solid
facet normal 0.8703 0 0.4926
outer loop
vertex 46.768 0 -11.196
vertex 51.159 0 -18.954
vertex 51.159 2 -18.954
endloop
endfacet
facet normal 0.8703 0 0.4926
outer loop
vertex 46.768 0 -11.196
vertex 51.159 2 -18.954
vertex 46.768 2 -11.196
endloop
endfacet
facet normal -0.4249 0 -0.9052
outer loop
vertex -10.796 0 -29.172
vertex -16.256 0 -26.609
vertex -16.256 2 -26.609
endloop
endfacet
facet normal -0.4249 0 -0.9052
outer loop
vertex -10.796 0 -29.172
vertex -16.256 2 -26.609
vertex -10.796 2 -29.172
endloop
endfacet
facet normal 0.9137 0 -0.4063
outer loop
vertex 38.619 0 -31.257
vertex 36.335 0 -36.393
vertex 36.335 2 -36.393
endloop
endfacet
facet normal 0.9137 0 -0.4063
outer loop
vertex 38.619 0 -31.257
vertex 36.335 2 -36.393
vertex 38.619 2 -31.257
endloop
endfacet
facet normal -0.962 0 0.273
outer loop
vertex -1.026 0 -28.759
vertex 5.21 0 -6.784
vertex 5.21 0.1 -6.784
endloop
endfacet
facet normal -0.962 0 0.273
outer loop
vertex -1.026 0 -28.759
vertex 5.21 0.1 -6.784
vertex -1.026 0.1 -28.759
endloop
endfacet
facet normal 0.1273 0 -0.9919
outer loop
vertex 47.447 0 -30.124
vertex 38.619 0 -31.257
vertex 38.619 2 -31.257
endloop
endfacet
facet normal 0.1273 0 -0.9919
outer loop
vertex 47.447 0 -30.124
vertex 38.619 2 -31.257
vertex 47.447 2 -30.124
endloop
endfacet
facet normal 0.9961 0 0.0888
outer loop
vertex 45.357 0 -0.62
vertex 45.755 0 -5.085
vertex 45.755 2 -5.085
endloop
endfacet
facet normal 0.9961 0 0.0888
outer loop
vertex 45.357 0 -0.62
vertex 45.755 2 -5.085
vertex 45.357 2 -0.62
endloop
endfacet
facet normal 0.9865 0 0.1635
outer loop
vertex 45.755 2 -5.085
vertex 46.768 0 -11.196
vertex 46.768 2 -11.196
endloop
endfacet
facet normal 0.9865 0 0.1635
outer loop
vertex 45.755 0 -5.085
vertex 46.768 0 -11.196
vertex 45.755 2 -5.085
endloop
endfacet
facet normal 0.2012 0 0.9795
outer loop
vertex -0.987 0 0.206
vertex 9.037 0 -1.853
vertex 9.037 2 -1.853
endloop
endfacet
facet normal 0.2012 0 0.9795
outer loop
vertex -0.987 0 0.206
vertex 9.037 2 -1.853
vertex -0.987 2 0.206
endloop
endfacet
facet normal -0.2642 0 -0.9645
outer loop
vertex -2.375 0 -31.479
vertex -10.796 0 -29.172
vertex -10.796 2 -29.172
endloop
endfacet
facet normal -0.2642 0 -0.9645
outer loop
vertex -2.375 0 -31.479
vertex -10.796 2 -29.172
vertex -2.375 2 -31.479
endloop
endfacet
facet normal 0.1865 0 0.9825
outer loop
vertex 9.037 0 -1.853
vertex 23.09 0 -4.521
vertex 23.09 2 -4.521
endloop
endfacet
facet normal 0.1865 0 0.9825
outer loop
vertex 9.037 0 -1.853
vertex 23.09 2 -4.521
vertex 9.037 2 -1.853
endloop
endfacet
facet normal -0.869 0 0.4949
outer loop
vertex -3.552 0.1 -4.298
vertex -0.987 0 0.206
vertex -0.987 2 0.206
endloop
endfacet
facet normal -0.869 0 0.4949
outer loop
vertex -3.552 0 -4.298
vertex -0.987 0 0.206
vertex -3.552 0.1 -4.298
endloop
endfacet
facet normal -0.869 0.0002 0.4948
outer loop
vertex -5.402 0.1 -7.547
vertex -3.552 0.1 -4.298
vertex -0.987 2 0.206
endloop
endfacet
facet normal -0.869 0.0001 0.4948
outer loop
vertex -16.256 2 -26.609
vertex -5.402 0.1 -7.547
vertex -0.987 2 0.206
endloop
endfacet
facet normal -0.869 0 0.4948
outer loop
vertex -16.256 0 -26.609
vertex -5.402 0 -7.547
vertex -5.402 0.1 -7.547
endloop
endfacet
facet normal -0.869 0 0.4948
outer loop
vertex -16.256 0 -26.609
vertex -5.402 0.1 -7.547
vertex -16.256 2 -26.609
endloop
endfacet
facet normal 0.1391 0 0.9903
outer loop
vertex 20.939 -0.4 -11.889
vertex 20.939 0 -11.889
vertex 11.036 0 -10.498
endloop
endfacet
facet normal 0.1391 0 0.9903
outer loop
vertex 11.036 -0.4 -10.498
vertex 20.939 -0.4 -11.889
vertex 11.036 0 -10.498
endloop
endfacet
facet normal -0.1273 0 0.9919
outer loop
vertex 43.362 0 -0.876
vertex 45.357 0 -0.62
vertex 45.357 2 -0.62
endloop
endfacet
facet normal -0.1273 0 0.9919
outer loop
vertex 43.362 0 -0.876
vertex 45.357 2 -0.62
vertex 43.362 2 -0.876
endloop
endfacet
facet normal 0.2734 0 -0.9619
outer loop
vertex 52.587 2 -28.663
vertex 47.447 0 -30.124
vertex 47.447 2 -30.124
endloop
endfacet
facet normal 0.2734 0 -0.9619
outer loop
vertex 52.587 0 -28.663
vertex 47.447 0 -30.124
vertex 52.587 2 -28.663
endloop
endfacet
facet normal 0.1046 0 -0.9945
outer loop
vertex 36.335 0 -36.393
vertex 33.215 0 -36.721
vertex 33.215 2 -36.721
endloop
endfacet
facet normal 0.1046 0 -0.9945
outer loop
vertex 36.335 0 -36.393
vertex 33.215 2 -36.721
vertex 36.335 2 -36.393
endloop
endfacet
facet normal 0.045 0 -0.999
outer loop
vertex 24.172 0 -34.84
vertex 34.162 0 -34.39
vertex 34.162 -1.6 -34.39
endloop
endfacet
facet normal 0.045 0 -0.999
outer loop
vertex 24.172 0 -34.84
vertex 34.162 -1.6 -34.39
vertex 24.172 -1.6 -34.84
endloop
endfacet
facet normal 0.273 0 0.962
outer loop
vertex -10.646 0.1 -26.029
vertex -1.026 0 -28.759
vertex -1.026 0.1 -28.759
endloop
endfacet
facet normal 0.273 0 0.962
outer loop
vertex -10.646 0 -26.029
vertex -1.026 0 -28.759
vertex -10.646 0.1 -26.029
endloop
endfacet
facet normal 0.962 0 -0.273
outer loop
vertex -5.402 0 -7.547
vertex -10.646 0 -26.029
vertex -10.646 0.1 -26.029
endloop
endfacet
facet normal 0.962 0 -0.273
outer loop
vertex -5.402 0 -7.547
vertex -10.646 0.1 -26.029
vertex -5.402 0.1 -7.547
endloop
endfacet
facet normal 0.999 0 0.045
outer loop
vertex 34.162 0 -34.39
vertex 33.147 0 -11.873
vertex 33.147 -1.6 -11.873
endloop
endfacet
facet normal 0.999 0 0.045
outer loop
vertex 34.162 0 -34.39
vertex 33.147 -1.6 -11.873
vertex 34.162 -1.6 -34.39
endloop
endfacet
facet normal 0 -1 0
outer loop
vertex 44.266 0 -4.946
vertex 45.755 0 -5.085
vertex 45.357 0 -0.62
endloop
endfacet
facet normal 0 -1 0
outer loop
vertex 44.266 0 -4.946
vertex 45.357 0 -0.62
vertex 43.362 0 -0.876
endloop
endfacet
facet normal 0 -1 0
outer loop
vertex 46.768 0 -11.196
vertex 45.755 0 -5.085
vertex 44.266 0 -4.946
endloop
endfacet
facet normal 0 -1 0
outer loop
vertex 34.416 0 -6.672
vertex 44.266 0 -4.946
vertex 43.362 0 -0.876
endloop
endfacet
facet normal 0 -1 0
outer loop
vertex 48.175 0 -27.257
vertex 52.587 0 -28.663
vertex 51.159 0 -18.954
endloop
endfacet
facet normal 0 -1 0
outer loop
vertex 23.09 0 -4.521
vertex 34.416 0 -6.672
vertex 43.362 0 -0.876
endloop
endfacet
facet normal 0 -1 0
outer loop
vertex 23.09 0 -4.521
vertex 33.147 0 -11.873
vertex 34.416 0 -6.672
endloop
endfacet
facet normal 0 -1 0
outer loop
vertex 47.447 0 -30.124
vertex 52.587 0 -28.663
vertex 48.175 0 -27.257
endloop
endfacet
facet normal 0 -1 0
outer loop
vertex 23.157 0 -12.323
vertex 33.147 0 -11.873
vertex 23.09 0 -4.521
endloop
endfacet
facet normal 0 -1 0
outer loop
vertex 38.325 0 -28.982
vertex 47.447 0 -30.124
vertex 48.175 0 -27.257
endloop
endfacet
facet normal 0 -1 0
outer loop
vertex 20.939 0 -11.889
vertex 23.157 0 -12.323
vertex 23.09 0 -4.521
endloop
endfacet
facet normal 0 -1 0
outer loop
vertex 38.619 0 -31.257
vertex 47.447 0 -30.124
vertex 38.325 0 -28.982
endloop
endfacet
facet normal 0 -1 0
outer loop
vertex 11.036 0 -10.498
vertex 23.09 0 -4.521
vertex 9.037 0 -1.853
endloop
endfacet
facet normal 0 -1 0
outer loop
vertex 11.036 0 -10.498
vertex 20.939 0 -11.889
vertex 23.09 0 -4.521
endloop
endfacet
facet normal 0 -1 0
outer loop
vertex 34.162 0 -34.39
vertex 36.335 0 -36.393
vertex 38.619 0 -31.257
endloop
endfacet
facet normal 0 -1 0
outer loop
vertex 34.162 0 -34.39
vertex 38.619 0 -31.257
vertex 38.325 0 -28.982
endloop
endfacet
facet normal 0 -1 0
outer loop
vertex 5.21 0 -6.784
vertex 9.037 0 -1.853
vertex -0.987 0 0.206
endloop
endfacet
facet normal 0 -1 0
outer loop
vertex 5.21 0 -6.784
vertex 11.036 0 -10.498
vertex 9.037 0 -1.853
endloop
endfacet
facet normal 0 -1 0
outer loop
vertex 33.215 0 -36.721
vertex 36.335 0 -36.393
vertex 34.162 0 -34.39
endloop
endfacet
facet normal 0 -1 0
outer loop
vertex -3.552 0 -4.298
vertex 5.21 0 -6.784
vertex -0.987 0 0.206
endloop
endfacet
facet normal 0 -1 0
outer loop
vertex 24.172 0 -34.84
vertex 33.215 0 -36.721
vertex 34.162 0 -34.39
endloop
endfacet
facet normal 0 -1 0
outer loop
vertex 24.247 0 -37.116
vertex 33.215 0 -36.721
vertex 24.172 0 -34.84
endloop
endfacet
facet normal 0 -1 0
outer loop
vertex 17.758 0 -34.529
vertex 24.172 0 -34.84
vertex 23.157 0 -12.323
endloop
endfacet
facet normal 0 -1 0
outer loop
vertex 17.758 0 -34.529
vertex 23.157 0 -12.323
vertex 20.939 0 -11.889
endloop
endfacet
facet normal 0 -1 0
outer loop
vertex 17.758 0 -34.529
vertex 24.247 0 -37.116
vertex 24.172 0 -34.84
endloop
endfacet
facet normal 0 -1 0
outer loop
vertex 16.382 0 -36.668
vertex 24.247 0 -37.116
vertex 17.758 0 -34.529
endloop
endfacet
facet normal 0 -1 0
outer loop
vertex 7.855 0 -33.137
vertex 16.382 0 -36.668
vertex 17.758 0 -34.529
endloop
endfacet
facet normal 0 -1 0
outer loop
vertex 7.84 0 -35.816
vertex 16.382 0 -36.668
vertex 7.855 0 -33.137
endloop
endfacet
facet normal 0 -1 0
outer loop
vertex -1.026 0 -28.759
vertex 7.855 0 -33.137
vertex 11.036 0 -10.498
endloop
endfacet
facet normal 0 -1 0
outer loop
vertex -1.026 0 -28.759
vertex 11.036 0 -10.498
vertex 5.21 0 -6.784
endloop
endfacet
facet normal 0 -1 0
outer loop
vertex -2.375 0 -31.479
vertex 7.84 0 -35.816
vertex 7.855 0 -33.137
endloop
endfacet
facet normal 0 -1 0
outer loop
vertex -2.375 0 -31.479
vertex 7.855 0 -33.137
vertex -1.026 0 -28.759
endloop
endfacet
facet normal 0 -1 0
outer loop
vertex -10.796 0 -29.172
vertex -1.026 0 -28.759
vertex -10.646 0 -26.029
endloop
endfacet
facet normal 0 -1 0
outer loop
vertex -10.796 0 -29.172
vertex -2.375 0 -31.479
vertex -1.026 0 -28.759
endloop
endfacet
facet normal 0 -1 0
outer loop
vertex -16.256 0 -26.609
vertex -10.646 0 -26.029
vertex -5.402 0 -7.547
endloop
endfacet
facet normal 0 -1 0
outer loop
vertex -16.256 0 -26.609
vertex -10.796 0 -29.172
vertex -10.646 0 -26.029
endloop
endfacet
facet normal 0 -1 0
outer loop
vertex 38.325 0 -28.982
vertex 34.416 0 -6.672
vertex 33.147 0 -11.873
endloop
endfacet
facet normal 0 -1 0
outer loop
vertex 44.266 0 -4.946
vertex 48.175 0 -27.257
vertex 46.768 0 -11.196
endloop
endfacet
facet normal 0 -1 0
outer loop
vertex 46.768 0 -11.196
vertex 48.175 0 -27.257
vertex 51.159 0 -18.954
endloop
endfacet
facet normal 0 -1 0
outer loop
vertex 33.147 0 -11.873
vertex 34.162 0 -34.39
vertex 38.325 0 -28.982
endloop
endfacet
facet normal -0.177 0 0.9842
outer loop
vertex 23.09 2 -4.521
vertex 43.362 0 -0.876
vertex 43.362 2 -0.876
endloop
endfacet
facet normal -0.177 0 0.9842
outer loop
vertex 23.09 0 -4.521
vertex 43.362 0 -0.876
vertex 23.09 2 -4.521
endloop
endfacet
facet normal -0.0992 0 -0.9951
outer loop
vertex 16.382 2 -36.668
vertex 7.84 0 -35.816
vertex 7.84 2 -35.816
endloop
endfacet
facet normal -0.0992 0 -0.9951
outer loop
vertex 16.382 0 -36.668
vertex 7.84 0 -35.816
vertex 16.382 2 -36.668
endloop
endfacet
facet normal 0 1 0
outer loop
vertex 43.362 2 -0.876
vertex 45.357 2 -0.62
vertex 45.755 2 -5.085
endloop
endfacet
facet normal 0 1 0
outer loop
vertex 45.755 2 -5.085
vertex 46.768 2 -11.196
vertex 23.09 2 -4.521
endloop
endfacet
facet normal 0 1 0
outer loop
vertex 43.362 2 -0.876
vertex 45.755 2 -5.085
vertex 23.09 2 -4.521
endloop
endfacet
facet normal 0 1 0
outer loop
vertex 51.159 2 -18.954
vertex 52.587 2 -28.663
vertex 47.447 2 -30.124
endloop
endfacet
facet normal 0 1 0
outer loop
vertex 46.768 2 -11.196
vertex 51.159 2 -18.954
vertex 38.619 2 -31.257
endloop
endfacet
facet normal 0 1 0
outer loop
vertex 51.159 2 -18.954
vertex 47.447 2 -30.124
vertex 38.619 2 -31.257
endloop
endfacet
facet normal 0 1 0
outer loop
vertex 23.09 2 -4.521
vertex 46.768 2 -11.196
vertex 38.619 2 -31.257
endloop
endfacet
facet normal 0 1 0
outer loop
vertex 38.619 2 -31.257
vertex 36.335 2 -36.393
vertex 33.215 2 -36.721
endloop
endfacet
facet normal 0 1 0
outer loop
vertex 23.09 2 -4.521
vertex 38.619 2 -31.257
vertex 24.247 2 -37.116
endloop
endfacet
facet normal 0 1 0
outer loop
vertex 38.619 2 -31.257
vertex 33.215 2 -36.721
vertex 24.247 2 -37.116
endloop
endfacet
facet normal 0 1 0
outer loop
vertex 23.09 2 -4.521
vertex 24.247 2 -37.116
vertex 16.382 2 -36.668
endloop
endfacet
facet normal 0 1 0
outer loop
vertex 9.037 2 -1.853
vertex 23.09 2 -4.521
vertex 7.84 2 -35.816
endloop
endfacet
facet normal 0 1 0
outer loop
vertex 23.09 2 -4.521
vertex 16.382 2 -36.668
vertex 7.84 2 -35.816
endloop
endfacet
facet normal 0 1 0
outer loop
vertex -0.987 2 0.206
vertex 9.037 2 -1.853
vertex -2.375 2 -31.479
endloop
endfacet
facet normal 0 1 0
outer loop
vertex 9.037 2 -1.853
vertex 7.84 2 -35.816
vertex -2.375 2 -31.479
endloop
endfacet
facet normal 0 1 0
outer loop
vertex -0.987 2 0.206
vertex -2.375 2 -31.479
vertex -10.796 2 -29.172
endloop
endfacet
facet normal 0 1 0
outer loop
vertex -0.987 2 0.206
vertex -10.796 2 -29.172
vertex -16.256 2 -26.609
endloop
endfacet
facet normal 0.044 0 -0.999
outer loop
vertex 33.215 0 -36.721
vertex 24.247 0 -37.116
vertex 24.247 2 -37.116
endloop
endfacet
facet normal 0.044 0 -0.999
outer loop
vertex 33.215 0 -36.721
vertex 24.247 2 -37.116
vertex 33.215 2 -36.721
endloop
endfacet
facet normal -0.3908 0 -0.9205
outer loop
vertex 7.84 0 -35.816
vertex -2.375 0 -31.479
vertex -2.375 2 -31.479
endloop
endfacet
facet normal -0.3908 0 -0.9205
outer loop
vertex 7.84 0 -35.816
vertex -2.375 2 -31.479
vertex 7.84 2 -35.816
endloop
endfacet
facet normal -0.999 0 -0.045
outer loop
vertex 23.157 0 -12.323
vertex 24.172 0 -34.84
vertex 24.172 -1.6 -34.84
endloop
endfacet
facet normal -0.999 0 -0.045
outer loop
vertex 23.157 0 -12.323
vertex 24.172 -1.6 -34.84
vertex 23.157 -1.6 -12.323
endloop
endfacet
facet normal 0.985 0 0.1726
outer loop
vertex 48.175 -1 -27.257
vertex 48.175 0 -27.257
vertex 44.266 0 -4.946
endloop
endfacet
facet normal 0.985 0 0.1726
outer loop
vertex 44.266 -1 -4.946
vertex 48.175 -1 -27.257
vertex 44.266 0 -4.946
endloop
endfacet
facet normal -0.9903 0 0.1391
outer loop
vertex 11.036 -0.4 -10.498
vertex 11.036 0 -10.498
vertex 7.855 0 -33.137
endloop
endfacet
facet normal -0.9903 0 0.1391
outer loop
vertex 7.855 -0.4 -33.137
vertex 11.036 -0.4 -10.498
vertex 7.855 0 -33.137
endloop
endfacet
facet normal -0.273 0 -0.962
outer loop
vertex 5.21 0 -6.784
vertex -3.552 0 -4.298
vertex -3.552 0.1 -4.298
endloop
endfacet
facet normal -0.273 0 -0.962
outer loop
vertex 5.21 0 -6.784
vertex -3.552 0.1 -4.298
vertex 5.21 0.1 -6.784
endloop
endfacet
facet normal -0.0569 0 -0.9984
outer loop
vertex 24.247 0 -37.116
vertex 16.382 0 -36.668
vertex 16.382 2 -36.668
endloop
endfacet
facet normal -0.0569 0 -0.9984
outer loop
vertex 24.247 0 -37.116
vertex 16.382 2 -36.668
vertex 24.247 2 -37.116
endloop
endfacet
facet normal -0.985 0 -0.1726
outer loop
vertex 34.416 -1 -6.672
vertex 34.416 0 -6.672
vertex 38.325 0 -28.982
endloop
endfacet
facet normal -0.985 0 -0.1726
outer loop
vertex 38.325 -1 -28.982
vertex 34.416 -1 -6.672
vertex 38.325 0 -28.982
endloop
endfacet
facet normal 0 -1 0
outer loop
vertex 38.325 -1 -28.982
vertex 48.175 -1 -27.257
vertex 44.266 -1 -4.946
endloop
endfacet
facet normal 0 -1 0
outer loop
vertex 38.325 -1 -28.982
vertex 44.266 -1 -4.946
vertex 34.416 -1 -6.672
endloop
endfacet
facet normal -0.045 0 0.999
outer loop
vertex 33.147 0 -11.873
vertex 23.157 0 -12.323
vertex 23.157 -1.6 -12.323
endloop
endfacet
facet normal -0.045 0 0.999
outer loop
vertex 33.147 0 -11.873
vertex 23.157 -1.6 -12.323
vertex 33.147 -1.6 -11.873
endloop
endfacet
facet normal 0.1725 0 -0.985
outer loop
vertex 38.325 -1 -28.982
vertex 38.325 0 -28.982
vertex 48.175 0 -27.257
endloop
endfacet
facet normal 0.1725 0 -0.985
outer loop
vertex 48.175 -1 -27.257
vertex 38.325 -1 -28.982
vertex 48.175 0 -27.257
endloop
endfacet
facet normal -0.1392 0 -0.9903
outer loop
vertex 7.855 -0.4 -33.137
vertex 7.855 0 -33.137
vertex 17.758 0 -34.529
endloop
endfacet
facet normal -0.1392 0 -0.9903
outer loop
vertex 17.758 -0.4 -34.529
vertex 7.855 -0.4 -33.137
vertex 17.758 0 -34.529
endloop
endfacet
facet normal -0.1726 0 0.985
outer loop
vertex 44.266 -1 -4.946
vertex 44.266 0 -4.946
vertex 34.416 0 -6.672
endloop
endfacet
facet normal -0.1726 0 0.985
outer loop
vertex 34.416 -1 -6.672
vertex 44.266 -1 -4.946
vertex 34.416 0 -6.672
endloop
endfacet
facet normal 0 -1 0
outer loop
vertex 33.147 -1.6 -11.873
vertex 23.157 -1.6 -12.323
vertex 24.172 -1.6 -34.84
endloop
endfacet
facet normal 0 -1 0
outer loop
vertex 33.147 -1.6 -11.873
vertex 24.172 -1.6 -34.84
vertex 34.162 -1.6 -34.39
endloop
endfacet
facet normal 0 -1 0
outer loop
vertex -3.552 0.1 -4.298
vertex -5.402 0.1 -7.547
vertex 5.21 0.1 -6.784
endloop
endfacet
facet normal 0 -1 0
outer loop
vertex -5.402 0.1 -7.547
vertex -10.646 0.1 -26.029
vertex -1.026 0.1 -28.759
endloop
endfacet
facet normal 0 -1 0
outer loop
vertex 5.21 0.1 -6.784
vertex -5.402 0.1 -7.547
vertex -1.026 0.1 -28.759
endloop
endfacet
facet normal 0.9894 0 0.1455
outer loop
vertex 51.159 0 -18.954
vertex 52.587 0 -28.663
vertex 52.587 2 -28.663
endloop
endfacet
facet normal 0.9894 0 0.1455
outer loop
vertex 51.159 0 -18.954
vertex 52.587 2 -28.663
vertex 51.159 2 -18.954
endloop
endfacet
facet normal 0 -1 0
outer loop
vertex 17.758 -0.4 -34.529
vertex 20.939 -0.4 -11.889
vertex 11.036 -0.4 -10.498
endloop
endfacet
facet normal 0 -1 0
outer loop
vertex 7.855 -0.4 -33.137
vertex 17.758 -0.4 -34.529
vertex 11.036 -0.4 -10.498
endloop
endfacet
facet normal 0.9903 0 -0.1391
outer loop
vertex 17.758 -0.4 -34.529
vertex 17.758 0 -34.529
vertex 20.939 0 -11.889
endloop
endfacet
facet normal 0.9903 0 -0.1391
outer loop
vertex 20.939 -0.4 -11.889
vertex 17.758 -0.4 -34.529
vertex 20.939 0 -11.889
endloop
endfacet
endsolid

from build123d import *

# Parameters (mm, degrees)
BOSS_EXTRUDE1_DEPTH = 0.1
BOSS_EXTRUDE2_DEPTH = 0.4
BOSS_EXTRUDE3_DEPTH = 1.6
BOSS_EXTRUDE4_DEPTH = 1
BOSS_EXTRUDE6_DEPTH = 2
CUT_EXTRUDE1_DEPTH  = 0.1


with BuildPart() as part:
    # Sketch1 → Boss-Extrude1 (new body)
    with BuildSketch(Plane(origin=(0, 0, 0), x_dir=(1, 0, 0), z_dir=(0, 1, 0))):
        Polygon((-10.646042249, 26.02895066), (-5.401733978, 7.546949539), (-3.551765124, 4.298091631), (5.209504113, 6.784120954), (-1.025832553, 28.758706218), align=None)
    extrude(amount=BOSS_EXTRUDE1_DEPTH)



with BuildPart() as body_2:
    # Sketch1<4> → Boss-Extrude2 (new body)
    with BuildSketch(Plane(origin=(0, 0, 0), x_dir=(1, 0, 0), z_dir=(0, 1, 0))):
        Polygon((17.758145427, 34.528733828), (7.855406085, 33.137420227), (11.036175402, 10.498146498), (20.938914744, 11.889460098), align=None)
    extrude(amount=-BOSS_EXTRUDE2_DEPTH)


with BuildPart() as body_3:
    # Sketch1<6> → Boss-Extrude3 (new body)
    with BuildSketch(Plane(origin=(0, 0, 0), x_dir=(1, 0, 0), z_dir=(0, 1, 0))):
        Polygon((34.161951749, 34.390264264), (24.172089788, 34.840439781), (23.15739477, 12.323304181), (33.147256731, 11.873128664), align=None)
    extrude(amount=-BOSS_EXTRUDE3_DEPTH)


with BuildPart() as body_4:
    # Sketch1<7> → Boss-Extrude4 (new body)
    with BuildSketch(Plane(origin=(0, 0, 0), x_dir=(1, 0, 0), z_dir=(0, 1, 0))):
        Polygon((48.175095059, 27.256571334), (38.325120534, 28.98226014), (34.416396618, 6.671846549), (44.266371143, 4.946157743), align=None)
    extrude(amount=-BOSS_EXTRUDE4_DEPTH)


with BuildPart() as part_1:
    add(part.part)

    add(body_2.part)  # Boss-Extrude6 merges body 2

    add(body_3.part)  # Boss-Extrude6 merges body 3

    add(body_4.part)  # Boss-Extrude6 merges body 4
    # Sketch1<9> → Boss-Extrude6 (add)
    with BuildSketch(Plane(origin=(0, 0, 0), x_dir=(1, 0, 0), z_dir=(0, 1, 0))):
        Polygon((-10.796366677, 29.172241213), (-16.256074113, 26.609004932), (-0.986799702, -0.206421066), (9.037125491, 1.85322051), (23.089608754, 4.521255887), (43.361671586, 0.876173274), (45.356947793, 0.620078516), (45.754807654, 5.085280828), (46.768236946, 11.196430212), (51.159441766, 18.953851746), (52.586728994, 28.662836734), (47.446591859, 30.124478905), (38.61884098, 31.25680776), (36.335094453, 36.39348437), (33.214867012, 36.720672561), (24.24680656, 37.115536931), (16.382403353, 36.668127405), (7.84022621, 35.816299809), (-2.37484271, 31.479114004), align=None)
    extrude(amount=BOSS_EXTRUDE6_DEPTH)

    # Sketch1<11> → Cut-Extrude1 (cut)
    with BuildSketch(Plane(origin=(0, 0, 0), x_dir=(1, 0, 0), z_dir=(0, 1, 0))):
        Polygon((-10.646042249, 26.02895066), (-5.401733978, 7.546949539), (-3.551765124, 4.298091631), (5.209504113, 6.784120954), (-1.025832553, 28.758706218), align=None)
    extrude(amount=CUT_EXTRUDE1_DEPTH, mode=Mode.SUBTRACT)


solid = part_1.part
